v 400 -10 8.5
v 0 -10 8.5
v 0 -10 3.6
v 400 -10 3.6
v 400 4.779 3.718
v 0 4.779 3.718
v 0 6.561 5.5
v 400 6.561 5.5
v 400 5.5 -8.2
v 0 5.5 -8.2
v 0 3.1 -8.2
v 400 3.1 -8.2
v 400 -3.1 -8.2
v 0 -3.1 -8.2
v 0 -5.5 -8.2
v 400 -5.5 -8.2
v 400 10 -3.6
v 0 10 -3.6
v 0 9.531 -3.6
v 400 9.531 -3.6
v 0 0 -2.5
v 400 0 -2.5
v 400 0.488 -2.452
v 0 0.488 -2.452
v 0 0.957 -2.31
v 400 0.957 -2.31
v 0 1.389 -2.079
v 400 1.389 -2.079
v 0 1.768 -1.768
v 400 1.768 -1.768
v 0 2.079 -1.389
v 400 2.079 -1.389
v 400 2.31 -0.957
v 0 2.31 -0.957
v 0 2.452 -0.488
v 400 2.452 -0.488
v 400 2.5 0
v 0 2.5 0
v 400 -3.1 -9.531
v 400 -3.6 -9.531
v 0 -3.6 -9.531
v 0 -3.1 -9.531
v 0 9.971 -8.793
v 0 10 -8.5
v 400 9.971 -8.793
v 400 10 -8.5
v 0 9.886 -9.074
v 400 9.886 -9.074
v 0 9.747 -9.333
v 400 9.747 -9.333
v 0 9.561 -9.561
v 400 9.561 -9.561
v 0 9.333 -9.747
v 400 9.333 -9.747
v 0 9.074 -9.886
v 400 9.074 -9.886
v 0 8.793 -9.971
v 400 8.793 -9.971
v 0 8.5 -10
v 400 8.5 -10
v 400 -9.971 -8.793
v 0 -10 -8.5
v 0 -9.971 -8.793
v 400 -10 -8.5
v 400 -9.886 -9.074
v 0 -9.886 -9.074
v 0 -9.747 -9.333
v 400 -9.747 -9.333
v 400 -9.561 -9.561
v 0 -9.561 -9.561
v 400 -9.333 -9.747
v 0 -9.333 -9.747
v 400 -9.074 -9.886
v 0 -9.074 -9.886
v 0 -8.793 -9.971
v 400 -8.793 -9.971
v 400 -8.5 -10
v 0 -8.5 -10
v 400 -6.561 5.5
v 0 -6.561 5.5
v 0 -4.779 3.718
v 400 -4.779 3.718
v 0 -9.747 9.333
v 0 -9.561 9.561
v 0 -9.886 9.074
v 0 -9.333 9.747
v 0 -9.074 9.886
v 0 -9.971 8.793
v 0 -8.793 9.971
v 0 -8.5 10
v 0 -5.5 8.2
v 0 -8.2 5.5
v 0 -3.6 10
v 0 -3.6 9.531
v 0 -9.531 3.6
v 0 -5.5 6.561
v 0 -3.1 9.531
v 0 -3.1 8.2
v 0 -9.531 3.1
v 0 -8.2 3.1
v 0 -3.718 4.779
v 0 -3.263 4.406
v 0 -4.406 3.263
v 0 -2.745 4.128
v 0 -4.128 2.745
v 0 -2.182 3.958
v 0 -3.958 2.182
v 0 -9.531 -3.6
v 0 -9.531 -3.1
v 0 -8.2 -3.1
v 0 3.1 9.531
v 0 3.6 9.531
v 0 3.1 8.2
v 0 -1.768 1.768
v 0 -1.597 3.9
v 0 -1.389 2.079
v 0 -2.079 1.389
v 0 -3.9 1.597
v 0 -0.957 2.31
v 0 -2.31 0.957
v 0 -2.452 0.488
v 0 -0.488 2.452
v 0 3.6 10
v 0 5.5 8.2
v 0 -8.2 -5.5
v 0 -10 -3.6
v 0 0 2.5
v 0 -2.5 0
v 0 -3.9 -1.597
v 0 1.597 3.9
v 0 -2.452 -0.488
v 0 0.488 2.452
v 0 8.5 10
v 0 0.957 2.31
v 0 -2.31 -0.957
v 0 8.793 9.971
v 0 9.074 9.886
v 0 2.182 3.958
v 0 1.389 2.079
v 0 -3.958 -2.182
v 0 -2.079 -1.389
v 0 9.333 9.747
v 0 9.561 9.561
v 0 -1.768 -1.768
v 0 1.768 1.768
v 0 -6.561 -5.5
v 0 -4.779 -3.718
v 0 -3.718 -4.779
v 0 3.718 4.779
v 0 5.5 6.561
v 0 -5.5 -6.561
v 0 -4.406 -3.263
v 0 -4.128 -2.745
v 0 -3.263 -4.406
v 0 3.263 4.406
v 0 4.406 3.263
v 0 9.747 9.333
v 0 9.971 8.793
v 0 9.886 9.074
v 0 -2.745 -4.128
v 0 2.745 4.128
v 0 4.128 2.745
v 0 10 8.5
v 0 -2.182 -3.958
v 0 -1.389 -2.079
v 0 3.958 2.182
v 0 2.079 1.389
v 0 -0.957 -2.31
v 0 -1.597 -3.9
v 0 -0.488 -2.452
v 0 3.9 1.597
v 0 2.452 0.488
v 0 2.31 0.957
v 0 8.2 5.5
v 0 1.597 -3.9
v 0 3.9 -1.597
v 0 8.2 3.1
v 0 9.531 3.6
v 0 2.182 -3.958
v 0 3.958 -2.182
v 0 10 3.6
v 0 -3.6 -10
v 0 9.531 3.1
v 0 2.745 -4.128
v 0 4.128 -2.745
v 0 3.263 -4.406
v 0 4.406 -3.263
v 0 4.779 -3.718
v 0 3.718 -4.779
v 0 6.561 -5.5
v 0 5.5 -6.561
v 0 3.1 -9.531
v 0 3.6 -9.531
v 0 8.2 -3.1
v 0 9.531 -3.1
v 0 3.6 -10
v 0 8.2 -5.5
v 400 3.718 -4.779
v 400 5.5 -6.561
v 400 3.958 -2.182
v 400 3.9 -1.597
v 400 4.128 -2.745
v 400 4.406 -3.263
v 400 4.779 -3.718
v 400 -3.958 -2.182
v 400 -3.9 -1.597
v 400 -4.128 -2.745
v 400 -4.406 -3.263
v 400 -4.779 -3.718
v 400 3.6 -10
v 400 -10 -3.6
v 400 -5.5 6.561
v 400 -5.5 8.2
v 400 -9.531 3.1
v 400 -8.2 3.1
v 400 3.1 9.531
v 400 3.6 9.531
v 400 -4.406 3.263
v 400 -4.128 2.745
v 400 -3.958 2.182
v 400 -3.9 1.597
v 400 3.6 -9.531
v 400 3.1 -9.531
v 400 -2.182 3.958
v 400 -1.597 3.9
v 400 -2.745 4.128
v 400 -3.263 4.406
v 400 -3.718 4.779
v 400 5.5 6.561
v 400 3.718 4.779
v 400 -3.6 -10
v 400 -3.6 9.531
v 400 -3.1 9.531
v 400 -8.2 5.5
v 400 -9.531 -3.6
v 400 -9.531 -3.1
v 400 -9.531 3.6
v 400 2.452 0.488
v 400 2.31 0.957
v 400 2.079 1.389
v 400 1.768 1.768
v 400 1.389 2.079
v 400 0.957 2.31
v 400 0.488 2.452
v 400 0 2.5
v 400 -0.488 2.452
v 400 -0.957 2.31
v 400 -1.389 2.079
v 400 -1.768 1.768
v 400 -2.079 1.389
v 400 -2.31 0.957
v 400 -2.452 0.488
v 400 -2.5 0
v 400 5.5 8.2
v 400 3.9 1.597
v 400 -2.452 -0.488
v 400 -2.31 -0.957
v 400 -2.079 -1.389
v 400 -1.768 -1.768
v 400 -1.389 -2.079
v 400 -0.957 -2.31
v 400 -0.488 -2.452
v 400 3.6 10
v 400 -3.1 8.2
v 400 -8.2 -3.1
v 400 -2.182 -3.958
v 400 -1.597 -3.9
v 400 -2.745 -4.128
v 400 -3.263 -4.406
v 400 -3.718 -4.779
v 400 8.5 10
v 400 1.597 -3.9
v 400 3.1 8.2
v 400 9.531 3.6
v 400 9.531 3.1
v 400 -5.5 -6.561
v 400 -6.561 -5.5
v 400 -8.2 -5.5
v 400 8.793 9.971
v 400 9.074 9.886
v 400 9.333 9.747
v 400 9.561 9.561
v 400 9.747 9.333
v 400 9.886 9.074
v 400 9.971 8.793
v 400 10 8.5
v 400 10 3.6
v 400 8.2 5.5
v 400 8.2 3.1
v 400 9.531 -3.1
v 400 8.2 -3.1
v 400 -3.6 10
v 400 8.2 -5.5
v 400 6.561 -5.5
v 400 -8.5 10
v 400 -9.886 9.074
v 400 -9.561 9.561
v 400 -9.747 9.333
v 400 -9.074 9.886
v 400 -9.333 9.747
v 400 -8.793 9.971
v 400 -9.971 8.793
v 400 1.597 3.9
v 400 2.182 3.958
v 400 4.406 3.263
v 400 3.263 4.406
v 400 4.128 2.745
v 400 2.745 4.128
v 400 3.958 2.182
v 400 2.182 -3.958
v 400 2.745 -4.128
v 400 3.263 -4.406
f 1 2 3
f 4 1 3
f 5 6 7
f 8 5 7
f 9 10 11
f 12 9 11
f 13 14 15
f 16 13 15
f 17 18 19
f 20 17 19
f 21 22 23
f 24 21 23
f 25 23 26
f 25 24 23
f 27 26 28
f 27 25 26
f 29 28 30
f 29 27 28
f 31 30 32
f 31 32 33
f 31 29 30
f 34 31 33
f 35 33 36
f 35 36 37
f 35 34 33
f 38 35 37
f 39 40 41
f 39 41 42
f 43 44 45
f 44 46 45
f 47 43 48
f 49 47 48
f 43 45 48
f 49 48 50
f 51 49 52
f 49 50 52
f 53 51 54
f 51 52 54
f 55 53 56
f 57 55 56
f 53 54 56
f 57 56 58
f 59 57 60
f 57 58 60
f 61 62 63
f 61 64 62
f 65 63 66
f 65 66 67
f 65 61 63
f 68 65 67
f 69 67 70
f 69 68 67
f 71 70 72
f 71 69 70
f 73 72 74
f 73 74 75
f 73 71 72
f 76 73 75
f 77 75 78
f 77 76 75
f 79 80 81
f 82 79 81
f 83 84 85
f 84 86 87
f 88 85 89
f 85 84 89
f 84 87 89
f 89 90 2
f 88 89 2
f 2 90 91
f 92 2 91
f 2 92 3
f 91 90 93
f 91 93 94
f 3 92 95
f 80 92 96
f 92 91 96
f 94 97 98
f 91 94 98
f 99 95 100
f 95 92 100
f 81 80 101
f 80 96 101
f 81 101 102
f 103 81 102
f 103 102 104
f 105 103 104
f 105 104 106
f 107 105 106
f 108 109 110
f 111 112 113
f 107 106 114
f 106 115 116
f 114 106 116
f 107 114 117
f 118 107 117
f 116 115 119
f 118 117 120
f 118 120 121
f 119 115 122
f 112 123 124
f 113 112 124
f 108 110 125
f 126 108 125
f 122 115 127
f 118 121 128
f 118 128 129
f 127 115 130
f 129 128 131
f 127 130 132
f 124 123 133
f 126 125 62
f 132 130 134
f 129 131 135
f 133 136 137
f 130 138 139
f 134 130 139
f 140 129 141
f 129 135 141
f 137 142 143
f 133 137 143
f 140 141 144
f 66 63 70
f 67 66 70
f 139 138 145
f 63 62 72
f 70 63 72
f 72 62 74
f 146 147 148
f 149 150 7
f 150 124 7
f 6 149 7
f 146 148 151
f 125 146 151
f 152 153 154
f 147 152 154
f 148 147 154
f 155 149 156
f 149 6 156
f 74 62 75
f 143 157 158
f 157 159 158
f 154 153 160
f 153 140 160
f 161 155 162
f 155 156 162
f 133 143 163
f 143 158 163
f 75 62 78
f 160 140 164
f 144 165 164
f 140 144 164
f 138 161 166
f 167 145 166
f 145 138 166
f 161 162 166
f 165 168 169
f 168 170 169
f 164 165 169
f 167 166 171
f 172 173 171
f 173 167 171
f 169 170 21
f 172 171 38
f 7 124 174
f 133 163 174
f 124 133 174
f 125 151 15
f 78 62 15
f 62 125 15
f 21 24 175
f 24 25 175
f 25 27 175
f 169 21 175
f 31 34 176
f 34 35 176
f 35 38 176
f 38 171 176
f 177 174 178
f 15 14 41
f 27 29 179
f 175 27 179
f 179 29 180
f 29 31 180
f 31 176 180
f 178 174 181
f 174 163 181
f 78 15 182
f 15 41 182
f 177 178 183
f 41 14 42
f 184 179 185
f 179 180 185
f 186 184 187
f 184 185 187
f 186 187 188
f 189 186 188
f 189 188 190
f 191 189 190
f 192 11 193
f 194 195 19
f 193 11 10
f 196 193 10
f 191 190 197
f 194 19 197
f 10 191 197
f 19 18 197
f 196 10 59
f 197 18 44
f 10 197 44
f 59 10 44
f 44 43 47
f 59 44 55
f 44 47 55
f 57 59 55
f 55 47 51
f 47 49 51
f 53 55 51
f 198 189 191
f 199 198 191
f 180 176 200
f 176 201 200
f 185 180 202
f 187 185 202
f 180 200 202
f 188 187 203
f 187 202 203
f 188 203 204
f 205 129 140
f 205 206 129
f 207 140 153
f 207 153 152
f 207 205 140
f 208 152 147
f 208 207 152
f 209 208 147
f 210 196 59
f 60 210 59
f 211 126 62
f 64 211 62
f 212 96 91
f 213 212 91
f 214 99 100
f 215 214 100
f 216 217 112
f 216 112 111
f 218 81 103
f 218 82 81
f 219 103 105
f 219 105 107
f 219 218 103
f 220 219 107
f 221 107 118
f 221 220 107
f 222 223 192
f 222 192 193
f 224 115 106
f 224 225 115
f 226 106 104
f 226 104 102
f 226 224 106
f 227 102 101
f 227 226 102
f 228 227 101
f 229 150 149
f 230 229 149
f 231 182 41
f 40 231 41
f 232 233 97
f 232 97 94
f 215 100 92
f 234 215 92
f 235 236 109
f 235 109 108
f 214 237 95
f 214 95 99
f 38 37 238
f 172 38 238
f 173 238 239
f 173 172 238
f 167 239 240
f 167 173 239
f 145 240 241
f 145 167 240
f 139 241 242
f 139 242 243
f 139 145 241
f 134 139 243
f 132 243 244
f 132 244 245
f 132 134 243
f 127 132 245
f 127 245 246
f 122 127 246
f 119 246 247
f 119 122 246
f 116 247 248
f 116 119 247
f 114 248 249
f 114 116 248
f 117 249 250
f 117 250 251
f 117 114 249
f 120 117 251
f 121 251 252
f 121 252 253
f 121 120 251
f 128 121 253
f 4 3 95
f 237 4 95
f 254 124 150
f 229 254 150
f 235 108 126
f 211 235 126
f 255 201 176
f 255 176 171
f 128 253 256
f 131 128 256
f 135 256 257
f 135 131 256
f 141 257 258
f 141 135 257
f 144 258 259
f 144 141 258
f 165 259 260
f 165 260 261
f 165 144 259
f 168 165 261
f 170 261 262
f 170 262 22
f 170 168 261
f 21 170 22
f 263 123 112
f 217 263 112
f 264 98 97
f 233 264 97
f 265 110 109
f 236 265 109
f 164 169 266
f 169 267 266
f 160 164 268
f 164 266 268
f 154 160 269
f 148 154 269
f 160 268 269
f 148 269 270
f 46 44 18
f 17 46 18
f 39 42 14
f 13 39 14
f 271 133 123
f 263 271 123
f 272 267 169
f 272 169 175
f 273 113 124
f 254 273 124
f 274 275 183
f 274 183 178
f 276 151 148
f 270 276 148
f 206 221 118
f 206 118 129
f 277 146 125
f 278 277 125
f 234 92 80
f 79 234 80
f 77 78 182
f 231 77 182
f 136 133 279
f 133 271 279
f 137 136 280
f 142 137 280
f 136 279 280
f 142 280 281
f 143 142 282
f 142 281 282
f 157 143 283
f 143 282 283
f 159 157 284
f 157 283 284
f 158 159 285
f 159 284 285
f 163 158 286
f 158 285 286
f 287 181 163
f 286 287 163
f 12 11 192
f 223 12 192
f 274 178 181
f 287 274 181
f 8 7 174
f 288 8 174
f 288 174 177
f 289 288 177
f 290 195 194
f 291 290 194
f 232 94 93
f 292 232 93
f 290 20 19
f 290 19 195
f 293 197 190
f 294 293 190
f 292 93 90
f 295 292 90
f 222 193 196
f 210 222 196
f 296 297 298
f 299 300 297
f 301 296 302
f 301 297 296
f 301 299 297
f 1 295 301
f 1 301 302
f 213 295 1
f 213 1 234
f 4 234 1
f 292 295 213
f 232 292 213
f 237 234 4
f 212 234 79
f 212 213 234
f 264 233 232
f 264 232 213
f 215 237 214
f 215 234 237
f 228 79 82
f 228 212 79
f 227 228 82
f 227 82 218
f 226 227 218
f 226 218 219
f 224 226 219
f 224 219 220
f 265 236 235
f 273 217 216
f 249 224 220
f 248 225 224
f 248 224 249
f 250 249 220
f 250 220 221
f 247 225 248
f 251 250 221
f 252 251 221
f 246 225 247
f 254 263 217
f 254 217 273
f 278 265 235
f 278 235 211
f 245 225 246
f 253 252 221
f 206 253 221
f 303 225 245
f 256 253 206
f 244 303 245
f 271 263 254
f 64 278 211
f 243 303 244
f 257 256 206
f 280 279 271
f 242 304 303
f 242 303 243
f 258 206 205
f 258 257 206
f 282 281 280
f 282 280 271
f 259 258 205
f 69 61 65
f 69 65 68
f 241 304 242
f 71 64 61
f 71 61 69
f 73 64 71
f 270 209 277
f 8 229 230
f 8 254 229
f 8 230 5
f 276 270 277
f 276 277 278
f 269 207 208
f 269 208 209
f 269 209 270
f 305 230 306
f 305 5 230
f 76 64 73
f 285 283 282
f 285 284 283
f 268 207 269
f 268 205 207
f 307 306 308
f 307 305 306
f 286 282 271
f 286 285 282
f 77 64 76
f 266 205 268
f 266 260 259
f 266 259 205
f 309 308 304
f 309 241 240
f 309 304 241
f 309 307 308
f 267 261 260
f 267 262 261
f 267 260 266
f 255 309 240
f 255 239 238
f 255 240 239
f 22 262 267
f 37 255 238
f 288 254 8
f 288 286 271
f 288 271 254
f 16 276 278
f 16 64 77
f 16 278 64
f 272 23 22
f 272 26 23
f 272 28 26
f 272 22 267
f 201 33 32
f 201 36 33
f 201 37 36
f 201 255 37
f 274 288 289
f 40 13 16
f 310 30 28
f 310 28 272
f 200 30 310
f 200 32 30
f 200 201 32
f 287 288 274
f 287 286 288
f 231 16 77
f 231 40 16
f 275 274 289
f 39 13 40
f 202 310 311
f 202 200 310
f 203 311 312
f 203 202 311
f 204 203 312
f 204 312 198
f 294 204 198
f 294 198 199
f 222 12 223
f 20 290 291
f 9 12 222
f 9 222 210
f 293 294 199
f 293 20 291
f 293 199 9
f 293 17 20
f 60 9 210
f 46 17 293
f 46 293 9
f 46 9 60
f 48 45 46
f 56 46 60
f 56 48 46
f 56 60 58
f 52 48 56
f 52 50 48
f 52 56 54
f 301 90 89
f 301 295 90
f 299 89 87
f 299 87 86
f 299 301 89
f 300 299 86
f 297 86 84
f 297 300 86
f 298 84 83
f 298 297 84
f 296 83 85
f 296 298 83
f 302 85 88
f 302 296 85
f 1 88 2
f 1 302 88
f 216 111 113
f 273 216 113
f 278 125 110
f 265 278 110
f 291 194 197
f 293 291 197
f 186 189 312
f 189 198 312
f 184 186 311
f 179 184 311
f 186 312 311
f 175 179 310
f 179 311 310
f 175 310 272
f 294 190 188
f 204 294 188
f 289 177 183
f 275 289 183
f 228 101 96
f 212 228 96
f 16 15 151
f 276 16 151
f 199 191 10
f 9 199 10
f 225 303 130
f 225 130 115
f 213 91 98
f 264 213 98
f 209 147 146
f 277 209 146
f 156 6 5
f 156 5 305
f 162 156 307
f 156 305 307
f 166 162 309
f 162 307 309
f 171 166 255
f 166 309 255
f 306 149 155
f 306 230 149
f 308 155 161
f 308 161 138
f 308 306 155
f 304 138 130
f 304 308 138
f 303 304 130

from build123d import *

# Parameters (mm, degrees)
EXTRUDE_1_DEPTH = 400
FILLET_1_R      = 1.5
FILLET_2_R      = 3


with BuildPart() as part:
    # 草图1 → 凸台-拉伸1 (new body)
    with BuildSketch(Plane(origin=(0, 0, 0), x_dir=(0, 0, -1), z_dir=(1, 0, 0))):
        Polygon((-10, 10), (-10, 3.6), (-9.530955747, 3.6), (-9.530955747, 3.1), (-8.2, 3.1), (-8.2, 5.5), (-6.560660172, 5.5), (-3.9, 2.839339828), (-3.9, 0), (-3.9, -2.839339828), (-6.560660172, -5.5), (-8.2, -5.5), (-8.2, -3.1), (-9.530955747, -3.1), (-9.530955747, -3.6), (-10, -3.6), (-10, -10), (-3.6, -10), (-3.6, -9.530955747), (-3.1, -9.530955747), (-3.1, -8.2), (-5.5, -8.2), (-5.5, -6.560660172), (-2.839339828, -3.9), (0, -3.9), (2.839339828, -3.9), (5.5, -6.560660172), (5.5, -8.2), (3.1, -8.2), (3.1, -9.530955747), (3.6, -9.530955747), (3.6, -10), (10, -10), (10, -3.6), (9.530955747, -3.6), (9.530955747, -3.1), (8.2, -3.1), (8.2, -5.5), (6.560660172, -5.5), (3.9, -2.839339828), (3.9, 0), (3.9, 2.839339828), (6.560660172, 5.5), (8.2, 5.5), (8.2, 3.1), (9.530955747, 3.1), (9.530955747, 3.6), (10, 3.6), (10, 10), (3.6, 10), (3.6, 9.530955747), (3.1, 9.530955747), (3.1, 8.2), (5.5, 8.2), (5.5, 6.560660172), (2.839339828, 3.9), (0, 3.9), (-2.839339828, 3.9), (-5.5, 6.560660172), (-5.5, 8.2), (-3.1, 8.2), (-3.1, 9.530955747), (-3.6, 9.530955747), (-3.6, 10), align=None)
        with BuildLine():
            ThreePointArc((0, 2.5), (-1.767766953, 1.767766953), (-2.5, 0))
            ThreePointArc((-2.5, 0), (-1.767766953, -1.767766953), (0, -2.5))
            ThreePointArc((0, -2.5), (1.767766953, -1.767766953), (2.5, 0))
            ThreePointArc((2.5, 0), (1.767766953, 1.767766953), (0, 2.5))
        make_face(mode=Mode.SUBTRACT)
    extrude(amount=EXTRUDE_1_DEPTH)

    # 圆角1
    fillet_1_edges = [part.edges().sort_by_distance(p)[0] for p in [
        (200, -10, -10),
        (200, -10, 10),
        (200, 10, 10),
        (200, 10, -10),
    ]]
    fillet(fillet_1_edges, radius=FILLET_1_R)

    # 圆角2
    fillet_2_edges = [part.edges().sort_by_distance(p)[0] for p in [
        (200, -3.9, -2.839339828),
        (200, -3.9, 2.839339828),
        (200, -2.839339828, 3.9),
        (200, 2.839339828, 3.9),
        (200, 3.9, 2.839339828),
        (200, 3.9, -2.839339828),
        (200, 2.839339828, -3.9),
        (200, -2.839339828, -3.9),
    ]]
    fillet(fillet_2_edges, radius=FILLET_2_R)


solid = part.part
